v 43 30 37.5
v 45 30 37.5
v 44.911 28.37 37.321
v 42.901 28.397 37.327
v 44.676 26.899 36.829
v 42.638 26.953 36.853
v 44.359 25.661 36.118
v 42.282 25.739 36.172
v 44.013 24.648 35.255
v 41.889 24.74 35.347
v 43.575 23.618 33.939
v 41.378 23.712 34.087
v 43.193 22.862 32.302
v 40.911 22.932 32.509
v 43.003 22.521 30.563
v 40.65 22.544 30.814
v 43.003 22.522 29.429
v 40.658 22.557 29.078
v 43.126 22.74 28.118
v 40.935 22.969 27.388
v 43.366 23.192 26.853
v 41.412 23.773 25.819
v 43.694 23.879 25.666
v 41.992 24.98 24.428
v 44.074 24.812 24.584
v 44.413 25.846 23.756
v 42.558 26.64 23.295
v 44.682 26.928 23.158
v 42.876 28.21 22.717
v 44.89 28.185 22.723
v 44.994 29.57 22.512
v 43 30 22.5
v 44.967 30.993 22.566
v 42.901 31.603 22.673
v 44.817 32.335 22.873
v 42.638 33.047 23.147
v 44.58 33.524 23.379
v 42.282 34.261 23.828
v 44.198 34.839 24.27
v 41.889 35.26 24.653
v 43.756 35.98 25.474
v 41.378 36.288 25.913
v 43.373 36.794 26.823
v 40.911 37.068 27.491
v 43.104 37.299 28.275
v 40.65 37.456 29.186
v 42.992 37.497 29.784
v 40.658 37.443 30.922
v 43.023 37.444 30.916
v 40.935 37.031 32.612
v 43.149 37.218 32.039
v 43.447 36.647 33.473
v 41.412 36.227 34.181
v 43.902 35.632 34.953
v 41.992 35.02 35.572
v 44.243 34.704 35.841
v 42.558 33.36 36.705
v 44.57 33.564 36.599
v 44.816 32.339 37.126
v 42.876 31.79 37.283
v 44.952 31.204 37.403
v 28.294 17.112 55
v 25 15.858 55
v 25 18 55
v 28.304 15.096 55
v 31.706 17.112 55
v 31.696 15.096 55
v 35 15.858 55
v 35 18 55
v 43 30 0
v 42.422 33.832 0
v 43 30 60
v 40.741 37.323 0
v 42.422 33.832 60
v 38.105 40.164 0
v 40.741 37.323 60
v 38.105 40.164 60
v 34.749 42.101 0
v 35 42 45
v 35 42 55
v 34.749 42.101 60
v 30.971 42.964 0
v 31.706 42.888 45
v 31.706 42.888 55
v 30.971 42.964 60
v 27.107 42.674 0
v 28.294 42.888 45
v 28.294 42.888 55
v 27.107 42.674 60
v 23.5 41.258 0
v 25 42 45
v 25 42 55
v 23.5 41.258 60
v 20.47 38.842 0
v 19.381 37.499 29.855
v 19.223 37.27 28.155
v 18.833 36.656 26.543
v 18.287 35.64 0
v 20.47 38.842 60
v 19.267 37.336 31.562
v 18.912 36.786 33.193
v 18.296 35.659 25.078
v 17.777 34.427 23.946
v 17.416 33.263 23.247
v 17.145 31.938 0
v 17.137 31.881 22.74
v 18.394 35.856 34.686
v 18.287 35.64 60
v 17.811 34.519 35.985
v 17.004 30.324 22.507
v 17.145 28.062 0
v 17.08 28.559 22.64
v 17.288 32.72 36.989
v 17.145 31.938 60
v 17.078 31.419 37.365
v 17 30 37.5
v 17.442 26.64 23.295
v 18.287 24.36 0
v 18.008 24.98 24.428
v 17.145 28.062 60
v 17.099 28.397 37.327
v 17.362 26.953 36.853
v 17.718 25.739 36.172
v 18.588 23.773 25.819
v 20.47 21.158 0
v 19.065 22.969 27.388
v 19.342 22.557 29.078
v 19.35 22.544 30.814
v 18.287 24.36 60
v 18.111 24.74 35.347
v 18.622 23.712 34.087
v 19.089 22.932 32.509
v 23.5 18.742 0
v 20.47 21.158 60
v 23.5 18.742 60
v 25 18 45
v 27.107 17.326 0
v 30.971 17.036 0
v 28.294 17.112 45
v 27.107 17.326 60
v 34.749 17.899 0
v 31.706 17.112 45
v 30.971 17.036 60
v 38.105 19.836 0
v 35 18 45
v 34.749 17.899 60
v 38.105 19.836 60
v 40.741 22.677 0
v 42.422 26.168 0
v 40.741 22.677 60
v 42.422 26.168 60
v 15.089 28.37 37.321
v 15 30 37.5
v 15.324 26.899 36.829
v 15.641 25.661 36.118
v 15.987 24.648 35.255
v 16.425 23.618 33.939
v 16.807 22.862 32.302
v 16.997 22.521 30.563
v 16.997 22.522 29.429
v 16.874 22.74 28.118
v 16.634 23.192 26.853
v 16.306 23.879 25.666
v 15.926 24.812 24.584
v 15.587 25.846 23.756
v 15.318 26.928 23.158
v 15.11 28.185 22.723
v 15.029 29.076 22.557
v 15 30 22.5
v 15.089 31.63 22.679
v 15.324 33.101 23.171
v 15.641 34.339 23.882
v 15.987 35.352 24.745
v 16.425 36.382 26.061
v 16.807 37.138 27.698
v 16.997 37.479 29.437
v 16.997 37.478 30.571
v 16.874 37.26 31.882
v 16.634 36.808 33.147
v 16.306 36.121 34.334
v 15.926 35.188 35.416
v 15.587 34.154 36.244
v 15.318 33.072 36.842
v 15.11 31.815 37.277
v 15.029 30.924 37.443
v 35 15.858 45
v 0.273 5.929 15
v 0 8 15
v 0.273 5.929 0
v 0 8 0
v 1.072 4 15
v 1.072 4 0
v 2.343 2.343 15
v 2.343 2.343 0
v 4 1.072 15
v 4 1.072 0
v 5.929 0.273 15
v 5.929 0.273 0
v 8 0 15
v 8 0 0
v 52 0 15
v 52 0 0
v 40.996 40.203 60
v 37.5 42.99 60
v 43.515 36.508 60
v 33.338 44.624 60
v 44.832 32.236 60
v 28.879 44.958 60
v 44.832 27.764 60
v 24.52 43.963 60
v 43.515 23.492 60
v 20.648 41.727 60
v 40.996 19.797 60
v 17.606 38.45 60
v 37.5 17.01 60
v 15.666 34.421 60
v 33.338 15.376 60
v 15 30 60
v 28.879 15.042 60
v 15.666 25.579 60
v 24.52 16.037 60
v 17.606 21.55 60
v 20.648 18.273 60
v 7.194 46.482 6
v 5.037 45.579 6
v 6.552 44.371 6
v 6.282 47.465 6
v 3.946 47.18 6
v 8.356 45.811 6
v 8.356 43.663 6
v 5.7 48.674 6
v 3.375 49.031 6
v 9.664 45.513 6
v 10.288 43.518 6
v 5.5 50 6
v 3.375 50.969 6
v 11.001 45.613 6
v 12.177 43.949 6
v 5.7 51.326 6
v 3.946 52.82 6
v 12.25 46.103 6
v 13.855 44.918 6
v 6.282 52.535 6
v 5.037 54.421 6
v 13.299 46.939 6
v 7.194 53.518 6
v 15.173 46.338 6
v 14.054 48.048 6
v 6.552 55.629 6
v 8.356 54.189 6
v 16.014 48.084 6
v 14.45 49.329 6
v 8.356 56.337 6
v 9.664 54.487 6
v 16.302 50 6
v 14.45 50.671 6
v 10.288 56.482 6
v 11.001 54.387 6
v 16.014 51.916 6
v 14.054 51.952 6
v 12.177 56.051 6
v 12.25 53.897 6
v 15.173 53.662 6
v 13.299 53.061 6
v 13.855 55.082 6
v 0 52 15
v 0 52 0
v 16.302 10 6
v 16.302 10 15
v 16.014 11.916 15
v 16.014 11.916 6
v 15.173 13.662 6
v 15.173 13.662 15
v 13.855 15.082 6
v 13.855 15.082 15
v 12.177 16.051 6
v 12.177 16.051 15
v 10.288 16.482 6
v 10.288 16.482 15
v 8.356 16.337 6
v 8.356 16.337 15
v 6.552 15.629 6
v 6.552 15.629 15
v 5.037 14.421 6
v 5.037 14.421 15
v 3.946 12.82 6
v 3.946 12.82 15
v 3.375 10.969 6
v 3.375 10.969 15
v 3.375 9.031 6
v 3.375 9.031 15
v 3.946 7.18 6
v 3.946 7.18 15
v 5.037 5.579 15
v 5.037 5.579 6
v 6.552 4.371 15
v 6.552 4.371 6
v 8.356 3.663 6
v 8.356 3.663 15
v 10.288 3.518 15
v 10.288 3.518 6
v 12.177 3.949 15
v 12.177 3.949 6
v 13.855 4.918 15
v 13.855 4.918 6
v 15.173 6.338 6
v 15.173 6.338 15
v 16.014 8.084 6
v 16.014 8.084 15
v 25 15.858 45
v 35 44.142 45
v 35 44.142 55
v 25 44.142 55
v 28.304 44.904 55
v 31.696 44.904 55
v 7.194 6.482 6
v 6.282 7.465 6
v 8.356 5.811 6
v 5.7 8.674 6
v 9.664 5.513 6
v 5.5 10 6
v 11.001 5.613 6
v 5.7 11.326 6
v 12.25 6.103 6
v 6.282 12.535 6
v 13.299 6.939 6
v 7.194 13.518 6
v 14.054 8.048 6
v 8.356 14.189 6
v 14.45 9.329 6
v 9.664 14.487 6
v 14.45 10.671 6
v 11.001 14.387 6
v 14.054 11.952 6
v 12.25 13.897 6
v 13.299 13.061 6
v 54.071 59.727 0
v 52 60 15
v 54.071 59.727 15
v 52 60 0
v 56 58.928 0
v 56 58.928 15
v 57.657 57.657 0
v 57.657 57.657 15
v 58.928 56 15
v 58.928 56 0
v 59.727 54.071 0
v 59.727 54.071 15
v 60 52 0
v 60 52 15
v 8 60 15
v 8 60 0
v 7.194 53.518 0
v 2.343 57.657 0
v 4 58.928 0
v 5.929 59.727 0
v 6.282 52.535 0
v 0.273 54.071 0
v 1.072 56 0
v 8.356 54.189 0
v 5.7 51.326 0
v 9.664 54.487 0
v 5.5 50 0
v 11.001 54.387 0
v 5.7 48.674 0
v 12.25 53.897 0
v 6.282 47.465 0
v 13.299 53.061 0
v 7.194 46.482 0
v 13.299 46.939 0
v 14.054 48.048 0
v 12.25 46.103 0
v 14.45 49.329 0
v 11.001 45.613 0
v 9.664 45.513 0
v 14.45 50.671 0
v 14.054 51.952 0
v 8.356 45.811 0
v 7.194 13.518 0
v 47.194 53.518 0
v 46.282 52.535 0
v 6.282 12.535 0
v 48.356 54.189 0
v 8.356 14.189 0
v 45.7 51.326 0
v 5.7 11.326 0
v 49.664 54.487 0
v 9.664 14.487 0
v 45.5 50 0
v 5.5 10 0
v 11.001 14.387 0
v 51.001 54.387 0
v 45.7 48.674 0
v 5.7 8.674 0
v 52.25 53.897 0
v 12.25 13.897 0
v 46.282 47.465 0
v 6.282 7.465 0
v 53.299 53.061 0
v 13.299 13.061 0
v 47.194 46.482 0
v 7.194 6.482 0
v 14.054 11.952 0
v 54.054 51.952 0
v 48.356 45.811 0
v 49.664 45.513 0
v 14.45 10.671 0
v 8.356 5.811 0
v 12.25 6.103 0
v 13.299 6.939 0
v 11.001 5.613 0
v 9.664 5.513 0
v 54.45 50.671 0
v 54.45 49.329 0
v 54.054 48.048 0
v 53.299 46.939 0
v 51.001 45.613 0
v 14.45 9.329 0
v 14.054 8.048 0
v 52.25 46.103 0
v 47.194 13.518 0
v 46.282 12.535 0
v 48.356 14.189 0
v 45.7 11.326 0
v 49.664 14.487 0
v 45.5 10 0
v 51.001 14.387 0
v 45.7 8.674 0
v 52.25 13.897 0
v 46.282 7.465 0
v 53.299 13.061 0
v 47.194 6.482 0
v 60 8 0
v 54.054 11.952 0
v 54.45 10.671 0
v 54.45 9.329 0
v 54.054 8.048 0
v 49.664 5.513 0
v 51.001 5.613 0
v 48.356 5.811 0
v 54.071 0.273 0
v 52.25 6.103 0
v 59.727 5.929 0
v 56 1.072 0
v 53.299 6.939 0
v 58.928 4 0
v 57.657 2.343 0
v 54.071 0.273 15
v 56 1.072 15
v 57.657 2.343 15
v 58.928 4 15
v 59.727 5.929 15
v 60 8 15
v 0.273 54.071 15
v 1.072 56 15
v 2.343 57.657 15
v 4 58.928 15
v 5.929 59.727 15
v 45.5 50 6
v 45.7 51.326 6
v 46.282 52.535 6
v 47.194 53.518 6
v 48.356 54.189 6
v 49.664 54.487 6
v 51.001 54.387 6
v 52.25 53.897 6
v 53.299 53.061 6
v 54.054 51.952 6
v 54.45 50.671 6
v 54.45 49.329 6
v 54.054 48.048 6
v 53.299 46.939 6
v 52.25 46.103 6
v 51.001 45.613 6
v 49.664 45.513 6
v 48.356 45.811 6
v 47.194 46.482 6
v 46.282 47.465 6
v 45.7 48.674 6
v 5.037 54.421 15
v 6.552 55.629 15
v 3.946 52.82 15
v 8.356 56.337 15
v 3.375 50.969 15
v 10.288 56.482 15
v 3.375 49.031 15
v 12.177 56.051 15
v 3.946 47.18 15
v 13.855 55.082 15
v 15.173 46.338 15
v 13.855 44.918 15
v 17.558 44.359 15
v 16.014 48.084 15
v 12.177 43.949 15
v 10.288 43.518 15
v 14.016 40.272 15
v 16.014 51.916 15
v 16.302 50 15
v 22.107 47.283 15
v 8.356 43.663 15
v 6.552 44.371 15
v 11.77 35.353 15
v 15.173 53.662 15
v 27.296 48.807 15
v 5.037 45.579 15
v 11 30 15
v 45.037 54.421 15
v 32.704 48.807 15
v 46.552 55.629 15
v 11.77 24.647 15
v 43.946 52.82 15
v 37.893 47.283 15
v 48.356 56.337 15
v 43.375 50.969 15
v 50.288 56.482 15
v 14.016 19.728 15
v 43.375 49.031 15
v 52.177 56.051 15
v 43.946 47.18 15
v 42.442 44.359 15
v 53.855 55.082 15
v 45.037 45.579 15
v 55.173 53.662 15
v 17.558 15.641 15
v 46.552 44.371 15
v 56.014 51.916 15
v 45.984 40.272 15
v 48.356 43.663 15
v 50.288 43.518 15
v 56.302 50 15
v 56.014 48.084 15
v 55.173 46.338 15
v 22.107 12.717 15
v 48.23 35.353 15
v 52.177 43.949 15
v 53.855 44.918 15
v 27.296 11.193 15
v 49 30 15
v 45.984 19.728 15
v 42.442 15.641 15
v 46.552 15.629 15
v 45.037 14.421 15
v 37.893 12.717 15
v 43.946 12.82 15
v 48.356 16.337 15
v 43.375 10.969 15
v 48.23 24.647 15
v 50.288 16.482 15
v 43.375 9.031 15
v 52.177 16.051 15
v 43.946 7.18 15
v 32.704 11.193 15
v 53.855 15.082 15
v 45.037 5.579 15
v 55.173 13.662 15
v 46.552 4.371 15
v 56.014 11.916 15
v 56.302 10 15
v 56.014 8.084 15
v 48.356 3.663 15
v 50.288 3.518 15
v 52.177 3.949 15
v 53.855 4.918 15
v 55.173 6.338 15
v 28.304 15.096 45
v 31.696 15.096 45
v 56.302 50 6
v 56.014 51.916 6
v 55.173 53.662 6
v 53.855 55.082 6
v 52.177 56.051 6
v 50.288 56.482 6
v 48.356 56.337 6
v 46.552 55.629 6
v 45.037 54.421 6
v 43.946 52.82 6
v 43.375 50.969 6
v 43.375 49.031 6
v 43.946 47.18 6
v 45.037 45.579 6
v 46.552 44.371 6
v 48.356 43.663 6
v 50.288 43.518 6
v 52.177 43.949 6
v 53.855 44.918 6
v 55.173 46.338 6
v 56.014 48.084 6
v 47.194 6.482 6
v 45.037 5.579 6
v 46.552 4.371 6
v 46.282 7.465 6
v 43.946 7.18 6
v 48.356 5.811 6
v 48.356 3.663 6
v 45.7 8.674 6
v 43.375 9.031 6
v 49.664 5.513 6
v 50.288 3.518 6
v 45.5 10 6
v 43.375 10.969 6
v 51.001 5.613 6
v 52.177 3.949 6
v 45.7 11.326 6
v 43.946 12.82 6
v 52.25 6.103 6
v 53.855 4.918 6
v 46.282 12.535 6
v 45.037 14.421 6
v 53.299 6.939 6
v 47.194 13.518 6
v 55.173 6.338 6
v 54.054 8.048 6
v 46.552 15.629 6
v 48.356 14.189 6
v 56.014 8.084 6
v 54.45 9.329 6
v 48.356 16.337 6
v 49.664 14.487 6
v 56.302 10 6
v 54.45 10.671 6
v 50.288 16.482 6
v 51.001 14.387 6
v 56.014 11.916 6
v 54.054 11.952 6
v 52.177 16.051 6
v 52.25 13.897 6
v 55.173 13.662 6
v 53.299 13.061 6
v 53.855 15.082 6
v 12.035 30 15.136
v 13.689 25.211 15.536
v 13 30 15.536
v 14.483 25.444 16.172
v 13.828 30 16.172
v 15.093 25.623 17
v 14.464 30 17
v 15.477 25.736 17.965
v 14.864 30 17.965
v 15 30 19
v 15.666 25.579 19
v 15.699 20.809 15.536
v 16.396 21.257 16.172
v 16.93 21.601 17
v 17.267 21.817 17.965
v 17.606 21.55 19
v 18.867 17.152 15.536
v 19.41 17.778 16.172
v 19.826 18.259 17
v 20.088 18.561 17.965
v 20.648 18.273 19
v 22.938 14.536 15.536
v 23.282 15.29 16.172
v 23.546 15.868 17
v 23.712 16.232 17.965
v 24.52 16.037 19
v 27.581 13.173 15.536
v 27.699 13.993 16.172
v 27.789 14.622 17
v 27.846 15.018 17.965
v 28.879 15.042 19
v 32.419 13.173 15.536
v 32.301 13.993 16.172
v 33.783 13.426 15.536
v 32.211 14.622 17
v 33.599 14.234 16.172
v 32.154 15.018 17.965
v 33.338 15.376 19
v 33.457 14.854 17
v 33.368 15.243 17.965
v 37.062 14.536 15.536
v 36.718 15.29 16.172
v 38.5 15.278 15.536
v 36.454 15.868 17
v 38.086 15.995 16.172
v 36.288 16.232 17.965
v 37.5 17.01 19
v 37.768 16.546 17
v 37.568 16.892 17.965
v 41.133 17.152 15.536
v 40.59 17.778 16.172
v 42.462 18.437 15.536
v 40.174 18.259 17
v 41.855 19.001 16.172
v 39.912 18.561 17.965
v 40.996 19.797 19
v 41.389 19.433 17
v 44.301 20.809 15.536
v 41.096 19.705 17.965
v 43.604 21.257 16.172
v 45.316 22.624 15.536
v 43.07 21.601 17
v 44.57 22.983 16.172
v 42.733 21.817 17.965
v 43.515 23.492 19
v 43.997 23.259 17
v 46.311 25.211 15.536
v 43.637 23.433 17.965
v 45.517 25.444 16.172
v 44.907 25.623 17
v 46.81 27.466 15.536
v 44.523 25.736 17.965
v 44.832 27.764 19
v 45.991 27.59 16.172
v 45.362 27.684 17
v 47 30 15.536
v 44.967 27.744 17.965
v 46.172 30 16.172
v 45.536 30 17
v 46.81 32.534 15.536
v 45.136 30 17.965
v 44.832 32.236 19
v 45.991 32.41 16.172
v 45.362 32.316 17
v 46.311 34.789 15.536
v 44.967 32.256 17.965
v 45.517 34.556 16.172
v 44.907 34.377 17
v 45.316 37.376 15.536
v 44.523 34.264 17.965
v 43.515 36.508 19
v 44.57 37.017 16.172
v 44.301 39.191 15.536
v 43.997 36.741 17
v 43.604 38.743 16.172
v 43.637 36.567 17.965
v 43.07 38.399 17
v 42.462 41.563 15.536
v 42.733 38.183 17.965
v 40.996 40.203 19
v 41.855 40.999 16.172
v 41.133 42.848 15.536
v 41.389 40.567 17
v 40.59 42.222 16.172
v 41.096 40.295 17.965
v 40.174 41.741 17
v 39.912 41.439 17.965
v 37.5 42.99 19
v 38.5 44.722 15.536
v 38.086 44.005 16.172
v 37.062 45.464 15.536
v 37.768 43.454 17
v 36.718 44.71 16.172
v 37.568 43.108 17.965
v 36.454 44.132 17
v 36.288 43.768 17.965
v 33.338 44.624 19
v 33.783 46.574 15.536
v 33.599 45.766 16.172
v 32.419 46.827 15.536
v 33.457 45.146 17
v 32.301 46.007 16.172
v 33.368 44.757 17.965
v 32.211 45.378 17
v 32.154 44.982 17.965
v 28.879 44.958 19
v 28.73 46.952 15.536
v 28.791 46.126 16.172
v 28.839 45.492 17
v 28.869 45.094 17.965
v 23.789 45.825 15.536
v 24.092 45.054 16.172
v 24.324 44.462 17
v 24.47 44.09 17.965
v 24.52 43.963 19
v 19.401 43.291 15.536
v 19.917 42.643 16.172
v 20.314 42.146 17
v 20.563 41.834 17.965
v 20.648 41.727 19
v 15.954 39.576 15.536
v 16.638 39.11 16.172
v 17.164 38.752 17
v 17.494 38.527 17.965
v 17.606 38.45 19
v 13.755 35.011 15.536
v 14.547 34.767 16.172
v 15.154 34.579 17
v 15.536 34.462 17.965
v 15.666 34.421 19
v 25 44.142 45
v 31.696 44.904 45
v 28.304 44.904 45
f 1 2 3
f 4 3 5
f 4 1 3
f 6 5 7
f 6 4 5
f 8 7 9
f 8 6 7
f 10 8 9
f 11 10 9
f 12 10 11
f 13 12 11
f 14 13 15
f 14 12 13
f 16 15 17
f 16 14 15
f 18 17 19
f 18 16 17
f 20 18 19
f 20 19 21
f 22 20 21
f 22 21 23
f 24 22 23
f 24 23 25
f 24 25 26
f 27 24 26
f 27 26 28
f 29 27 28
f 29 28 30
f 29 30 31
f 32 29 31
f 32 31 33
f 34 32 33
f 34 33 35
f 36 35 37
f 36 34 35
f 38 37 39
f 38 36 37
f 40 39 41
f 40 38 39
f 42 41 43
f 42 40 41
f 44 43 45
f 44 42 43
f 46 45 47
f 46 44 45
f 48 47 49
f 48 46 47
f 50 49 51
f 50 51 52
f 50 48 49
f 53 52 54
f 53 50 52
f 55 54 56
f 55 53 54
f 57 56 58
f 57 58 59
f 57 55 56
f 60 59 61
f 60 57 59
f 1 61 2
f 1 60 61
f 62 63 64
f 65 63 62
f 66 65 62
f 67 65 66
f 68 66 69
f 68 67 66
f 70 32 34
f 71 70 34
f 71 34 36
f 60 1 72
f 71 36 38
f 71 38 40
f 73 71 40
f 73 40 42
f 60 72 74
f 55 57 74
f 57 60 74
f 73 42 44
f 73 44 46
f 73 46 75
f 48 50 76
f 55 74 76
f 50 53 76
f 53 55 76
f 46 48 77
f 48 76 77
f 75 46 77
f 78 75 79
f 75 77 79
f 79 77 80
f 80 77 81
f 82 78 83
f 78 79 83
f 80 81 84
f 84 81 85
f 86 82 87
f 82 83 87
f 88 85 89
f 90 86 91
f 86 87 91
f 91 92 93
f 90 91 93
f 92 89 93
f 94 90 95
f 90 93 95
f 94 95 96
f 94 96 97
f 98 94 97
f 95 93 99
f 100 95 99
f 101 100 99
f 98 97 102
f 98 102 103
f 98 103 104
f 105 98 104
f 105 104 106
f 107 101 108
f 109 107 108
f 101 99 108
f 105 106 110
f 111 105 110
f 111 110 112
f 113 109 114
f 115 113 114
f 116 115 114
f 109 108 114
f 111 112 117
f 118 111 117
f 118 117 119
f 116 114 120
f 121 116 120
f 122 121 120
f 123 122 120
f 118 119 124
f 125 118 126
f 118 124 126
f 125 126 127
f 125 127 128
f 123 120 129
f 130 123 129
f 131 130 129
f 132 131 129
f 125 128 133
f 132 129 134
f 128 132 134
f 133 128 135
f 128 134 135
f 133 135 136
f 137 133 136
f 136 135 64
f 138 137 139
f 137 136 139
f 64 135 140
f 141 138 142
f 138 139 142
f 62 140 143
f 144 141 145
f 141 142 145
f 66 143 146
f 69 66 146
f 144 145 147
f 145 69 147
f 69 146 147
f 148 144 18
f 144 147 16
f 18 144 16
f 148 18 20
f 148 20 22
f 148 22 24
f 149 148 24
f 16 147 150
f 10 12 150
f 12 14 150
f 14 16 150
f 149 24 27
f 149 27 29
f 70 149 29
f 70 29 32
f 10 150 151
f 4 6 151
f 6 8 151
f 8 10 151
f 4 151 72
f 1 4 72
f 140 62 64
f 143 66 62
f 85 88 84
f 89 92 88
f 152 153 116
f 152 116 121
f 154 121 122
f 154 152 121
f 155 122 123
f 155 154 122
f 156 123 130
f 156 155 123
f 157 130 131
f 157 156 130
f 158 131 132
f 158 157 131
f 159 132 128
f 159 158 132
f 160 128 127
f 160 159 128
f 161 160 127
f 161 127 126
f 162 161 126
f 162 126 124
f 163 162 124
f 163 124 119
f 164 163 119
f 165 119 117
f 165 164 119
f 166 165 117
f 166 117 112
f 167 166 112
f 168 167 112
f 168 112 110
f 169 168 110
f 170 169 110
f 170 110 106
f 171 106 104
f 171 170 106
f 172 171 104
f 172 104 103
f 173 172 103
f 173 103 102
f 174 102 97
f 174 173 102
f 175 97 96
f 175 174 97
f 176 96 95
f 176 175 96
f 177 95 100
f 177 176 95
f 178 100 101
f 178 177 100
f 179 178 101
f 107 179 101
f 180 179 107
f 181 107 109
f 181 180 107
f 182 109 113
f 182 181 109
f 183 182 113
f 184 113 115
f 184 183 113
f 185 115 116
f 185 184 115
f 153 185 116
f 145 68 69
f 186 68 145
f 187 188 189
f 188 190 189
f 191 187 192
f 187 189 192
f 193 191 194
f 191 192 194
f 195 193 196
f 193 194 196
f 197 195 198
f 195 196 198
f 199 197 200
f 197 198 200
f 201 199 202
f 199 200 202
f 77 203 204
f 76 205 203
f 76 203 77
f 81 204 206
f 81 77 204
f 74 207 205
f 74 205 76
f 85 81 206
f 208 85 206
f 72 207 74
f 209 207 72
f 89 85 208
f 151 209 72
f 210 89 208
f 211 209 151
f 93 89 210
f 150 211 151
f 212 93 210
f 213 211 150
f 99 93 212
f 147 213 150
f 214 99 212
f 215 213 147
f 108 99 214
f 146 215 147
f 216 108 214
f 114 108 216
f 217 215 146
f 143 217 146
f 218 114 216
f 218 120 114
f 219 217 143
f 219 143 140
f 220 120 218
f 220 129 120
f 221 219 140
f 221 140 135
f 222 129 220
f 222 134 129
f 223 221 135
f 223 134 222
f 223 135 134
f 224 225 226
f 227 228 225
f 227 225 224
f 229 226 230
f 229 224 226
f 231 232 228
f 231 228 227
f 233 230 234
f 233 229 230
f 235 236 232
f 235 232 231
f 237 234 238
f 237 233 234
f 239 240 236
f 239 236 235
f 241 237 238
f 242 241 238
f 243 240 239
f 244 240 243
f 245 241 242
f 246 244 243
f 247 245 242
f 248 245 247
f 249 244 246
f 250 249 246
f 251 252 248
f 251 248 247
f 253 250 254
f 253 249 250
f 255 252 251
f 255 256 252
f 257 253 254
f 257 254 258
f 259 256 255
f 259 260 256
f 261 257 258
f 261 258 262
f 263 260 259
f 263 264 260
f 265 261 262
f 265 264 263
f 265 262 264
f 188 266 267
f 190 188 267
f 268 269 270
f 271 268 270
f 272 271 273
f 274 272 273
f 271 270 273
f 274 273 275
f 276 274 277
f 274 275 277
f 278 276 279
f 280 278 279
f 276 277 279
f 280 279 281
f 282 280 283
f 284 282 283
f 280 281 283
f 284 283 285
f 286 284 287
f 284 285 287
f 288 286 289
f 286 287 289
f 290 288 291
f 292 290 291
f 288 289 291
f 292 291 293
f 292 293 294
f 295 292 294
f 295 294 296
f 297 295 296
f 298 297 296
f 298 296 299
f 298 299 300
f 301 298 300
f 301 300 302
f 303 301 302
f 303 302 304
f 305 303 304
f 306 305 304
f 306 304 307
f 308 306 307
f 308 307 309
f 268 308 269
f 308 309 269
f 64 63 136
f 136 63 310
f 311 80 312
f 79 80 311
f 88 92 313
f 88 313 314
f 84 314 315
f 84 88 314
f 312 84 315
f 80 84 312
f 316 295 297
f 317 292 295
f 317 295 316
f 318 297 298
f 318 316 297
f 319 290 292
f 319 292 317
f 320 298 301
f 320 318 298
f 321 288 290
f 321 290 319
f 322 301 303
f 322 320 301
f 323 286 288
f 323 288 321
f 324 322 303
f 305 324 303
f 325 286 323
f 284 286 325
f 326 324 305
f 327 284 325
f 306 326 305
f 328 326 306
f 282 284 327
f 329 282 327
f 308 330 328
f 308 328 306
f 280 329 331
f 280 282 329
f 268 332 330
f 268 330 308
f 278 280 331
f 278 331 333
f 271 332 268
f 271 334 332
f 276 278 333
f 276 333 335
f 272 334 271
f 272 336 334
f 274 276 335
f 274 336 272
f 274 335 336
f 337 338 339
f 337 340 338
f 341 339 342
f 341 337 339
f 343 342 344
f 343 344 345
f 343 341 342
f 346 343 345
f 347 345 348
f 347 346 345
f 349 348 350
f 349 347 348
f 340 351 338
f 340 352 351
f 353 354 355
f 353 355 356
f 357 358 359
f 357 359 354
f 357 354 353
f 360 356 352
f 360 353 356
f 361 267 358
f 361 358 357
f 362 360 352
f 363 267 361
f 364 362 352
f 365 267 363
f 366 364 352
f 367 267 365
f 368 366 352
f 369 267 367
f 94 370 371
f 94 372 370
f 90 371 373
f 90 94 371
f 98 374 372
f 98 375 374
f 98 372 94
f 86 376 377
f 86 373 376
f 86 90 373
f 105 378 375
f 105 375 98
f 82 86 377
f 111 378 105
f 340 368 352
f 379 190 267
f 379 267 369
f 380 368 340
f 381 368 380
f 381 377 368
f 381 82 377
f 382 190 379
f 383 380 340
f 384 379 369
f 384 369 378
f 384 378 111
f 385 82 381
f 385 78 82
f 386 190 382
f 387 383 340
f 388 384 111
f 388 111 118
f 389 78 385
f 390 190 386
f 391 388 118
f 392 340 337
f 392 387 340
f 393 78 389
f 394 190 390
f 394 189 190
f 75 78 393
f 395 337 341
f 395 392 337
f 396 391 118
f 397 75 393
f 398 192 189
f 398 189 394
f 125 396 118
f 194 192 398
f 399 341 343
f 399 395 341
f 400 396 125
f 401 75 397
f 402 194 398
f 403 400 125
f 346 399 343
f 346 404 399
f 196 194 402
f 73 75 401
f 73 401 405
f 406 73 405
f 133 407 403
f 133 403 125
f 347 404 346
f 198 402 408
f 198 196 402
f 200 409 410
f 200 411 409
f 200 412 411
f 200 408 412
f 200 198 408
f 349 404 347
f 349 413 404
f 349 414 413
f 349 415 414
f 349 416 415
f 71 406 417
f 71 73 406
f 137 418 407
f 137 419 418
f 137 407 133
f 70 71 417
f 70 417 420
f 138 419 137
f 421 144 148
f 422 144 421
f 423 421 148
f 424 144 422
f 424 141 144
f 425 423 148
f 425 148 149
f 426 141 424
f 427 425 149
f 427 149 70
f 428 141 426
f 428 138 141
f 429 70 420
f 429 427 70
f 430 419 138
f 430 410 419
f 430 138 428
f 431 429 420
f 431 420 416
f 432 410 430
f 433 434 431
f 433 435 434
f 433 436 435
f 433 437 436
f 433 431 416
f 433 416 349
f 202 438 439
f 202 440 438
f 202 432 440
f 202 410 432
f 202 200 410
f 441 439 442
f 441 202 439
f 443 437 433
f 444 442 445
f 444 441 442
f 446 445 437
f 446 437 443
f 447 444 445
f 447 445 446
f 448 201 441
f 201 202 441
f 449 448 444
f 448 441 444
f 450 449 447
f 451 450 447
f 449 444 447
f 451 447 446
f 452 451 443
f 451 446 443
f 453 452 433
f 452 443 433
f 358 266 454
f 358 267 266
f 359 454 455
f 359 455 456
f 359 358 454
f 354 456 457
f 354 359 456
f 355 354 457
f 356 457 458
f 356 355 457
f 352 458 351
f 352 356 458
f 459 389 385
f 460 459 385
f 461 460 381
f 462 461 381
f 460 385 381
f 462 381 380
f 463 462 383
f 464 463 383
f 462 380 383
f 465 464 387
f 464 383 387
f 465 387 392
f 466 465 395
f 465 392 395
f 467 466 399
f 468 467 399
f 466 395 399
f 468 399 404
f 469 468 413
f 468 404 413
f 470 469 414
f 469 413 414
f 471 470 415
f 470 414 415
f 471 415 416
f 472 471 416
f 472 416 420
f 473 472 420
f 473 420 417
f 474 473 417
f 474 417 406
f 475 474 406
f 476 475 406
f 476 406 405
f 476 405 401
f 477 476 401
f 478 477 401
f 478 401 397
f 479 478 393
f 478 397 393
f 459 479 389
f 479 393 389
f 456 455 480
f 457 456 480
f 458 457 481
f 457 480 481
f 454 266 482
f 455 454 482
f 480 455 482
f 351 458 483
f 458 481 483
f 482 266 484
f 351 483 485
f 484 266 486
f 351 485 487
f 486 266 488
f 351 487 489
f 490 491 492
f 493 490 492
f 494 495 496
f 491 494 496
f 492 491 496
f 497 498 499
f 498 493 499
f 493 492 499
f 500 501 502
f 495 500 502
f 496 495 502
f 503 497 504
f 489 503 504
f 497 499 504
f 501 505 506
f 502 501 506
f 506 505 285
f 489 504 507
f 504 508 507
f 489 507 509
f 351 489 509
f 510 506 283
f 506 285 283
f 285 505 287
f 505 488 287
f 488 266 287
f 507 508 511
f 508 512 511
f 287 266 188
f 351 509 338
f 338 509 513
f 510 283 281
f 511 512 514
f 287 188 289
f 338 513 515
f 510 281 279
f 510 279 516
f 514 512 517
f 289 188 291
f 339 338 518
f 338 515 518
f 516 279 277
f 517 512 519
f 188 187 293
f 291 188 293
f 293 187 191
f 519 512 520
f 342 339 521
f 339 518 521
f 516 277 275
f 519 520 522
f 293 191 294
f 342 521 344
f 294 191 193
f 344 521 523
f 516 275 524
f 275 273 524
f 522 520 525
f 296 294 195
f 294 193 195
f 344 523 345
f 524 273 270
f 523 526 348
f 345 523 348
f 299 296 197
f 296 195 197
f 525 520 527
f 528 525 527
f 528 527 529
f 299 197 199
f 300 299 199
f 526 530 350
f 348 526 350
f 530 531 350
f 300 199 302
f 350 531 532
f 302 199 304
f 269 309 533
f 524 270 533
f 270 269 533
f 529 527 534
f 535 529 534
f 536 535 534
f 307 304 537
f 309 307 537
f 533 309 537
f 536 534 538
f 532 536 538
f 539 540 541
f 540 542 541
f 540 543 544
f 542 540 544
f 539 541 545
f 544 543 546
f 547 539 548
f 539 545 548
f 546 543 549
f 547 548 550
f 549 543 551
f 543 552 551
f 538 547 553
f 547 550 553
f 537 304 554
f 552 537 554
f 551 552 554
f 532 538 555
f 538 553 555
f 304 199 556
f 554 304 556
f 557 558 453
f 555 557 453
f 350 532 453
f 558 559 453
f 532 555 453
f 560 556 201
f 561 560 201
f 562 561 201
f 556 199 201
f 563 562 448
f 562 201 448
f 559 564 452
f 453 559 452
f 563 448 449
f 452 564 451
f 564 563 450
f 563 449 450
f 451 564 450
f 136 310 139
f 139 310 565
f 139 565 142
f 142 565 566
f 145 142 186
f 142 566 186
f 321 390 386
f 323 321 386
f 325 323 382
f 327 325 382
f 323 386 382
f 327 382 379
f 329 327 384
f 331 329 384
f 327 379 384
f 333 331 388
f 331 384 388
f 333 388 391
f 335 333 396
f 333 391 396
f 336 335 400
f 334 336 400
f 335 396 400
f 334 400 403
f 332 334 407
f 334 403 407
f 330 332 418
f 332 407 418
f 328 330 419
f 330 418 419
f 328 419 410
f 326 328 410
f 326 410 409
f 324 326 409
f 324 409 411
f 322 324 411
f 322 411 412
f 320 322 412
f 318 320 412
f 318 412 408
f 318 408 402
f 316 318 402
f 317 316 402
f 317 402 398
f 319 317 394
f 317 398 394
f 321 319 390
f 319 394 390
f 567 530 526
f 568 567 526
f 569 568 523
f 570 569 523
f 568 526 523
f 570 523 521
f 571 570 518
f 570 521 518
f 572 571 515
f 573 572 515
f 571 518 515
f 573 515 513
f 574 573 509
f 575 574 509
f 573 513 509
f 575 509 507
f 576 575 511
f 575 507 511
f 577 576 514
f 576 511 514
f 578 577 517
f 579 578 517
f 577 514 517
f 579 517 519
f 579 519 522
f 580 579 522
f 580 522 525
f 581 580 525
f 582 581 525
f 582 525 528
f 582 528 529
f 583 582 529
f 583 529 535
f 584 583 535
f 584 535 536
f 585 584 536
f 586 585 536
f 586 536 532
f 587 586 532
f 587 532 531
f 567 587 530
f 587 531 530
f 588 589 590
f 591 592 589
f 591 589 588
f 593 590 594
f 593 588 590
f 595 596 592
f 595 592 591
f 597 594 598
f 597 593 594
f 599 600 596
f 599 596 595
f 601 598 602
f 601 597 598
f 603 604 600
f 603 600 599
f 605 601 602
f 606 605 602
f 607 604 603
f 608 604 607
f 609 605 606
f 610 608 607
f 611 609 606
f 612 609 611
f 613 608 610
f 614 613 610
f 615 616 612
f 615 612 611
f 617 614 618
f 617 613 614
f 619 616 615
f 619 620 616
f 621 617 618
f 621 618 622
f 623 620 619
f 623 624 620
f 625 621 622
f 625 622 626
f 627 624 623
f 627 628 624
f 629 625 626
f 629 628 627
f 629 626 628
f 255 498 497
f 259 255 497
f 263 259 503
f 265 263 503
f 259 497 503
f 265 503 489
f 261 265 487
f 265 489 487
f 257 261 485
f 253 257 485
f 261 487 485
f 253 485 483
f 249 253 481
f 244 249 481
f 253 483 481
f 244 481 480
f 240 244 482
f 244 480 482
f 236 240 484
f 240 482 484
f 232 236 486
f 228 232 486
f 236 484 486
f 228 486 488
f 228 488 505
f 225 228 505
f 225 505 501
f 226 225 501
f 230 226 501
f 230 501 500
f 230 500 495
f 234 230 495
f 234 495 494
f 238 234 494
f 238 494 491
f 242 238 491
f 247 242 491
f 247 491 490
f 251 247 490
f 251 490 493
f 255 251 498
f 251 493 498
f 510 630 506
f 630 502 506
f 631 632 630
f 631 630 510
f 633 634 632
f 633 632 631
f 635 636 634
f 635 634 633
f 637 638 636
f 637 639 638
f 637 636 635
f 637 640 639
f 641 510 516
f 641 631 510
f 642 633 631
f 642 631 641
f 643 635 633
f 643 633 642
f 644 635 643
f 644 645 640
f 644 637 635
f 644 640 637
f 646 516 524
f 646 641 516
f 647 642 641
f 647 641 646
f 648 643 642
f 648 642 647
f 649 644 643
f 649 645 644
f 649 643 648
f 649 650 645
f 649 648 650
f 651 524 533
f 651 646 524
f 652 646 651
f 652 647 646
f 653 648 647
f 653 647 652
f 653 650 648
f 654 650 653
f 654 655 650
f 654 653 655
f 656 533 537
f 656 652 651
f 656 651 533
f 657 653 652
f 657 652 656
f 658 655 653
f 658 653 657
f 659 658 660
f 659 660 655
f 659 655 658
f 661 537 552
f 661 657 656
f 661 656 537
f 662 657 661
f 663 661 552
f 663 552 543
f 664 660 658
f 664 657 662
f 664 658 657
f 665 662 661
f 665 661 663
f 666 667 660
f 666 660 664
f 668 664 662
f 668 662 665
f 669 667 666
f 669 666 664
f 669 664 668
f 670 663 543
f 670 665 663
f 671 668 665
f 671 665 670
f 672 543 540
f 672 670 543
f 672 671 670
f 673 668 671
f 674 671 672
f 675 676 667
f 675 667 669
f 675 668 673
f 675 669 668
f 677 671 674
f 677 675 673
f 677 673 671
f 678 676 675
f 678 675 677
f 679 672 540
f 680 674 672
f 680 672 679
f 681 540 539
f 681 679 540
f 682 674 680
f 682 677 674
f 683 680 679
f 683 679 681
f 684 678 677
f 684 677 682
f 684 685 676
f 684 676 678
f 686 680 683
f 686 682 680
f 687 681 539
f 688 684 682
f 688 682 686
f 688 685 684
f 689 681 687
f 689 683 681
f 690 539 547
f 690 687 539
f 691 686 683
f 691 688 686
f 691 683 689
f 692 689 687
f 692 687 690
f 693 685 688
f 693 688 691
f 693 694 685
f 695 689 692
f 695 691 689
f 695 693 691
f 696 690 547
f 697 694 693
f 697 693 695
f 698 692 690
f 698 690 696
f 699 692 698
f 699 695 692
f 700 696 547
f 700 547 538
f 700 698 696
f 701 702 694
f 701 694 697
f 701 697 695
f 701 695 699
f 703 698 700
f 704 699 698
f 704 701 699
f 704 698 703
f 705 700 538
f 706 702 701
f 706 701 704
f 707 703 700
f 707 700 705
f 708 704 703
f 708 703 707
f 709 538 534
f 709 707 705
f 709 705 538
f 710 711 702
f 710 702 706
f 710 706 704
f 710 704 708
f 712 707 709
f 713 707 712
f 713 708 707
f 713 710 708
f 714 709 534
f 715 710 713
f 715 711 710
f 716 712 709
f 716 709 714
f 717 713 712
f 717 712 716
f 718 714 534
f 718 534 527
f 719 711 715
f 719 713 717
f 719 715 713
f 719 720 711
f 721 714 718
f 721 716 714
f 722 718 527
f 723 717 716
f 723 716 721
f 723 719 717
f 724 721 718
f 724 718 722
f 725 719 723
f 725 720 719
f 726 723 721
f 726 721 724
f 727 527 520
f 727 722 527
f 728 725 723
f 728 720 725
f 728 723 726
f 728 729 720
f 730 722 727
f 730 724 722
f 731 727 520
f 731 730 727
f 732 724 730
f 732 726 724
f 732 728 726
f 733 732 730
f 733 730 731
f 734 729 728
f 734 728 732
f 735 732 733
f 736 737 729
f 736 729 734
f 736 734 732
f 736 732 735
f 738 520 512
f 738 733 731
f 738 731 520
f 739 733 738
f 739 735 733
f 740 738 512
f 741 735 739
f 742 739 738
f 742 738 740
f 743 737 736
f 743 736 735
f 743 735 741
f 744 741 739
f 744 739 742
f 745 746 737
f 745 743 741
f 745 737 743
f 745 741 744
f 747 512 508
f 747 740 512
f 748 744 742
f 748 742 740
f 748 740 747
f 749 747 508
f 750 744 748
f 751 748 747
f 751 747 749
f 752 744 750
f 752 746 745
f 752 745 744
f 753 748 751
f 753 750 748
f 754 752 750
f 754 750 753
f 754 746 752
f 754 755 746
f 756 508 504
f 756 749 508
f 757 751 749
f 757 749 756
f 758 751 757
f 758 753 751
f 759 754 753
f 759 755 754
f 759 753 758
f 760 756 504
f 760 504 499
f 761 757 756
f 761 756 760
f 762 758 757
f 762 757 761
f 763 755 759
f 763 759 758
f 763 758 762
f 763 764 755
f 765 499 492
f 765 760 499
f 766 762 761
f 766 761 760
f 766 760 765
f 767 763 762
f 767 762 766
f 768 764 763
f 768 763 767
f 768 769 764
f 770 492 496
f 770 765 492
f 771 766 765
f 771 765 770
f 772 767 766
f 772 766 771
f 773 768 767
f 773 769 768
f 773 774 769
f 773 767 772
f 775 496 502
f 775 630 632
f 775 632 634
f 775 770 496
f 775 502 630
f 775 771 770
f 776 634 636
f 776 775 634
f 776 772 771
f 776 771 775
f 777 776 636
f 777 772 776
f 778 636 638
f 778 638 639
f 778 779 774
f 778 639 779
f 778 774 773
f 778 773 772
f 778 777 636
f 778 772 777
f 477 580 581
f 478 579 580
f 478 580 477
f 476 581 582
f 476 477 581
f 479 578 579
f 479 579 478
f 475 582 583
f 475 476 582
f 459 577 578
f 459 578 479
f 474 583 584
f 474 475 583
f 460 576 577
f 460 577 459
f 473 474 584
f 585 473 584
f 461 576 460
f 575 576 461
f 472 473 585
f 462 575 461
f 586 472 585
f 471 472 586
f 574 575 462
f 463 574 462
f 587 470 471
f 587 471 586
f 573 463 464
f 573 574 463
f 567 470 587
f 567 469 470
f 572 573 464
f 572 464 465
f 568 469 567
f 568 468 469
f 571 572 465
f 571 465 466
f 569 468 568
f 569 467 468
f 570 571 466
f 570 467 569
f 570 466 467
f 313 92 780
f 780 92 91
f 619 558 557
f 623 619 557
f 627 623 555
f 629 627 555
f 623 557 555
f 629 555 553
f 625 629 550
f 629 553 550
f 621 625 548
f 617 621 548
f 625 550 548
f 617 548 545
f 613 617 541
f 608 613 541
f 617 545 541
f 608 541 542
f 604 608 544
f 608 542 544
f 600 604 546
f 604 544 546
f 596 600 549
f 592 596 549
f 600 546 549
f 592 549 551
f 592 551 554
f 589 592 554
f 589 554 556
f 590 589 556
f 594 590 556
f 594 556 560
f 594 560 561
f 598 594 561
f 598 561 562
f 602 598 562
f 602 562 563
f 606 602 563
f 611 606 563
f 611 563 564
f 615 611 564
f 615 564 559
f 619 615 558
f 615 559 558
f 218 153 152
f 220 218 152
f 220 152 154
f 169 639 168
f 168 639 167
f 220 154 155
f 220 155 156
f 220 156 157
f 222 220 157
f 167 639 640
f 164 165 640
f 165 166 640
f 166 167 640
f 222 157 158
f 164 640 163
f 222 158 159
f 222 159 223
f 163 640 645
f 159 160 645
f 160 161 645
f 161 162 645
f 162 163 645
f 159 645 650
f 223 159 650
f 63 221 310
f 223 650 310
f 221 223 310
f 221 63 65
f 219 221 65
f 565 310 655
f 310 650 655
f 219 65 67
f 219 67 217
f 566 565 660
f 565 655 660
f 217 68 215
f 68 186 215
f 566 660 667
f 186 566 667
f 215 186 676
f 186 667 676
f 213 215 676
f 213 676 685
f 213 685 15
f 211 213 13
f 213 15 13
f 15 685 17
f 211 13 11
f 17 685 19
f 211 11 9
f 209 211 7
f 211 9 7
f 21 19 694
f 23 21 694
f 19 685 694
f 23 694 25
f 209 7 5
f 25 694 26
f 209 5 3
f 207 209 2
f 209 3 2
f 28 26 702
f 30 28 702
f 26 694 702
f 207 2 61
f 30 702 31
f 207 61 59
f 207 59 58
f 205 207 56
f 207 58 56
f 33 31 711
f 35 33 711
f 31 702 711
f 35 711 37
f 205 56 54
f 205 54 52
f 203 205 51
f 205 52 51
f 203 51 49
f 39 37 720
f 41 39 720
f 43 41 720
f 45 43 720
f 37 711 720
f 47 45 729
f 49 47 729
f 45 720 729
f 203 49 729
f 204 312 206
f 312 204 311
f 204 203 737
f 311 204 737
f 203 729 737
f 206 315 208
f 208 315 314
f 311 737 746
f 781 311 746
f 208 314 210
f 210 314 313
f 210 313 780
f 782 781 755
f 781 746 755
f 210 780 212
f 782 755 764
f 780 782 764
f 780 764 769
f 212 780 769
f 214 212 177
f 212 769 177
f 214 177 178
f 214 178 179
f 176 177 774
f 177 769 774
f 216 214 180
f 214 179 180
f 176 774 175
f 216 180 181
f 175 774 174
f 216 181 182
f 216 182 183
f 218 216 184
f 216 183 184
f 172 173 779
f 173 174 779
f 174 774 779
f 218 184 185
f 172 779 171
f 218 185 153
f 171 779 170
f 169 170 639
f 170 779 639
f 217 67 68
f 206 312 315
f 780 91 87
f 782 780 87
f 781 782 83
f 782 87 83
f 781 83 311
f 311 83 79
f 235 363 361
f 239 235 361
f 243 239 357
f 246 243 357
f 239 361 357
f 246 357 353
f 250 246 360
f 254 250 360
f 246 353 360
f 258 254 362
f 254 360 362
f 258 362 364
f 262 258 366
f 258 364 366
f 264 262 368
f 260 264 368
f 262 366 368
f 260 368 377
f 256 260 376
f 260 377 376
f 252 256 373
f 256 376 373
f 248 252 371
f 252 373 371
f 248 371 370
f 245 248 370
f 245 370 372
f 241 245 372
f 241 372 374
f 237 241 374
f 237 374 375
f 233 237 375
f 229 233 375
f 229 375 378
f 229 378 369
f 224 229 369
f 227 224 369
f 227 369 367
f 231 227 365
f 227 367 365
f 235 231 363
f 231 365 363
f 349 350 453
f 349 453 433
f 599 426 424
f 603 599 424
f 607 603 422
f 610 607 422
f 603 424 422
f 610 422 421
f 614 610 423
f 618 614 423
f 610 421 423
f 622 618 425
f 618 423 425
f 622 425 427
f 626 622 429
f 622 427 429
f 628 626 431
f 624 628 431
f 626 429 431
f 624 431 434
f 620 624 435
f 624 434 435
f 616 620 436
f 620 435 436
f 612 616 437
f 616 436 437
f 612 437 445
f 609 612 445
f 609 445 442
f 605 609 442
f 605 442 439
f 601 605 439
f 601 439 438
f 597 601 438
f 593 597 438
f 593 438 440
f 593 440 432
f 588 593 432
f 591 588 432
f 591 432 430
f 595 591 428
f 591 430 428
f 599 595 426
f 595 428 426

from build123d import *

# Parameters (mm, degrees)
ESBO_O1_W                = 60
ESBO_O1_H                = 15
RESSALTO_EXTRUS_O1_DEPTH = 60
ESBO_O4_R                = 6.5
CORTE_EXTRUS_O1_DEPTH    = 9
ESBO_O5_R                = 4.5
CORTE_EXTRUS_O2_DEPTH    = 6
ESBO_O6_R                = 15
RESSALTO_EXTRUS_O3_DEPTH = 45
ESBO_O7_R                = 13
CORTE_EXTRUS_O3_DEPTH    = 104.923048454
FILETE2_R                = 4
ESBO_O8_R                = 7.5
CORTE_EXTRUS_O10_DEPTH   = 104.923048454
ESBO_O9_W                = 10
ESBO_O9_H                = 10
CORTE_EXTRUS_O11_DEPTH   = 104.923048512
FILETE3_R                = 8


with BuildPart() as part:
    # Esboço1 → Ressalto-extrusão1 (new body)
    with BuildSketch(Plane(origin=(0, 0, 0), x_dir=(1, 0, 0), z_dir=(0, 1, 0))):
        with Locations((30, -7.5)):
            Rectangle(ESBO_O1_W, ESBO_O1_H)
    extrude(amount=RESSALTO_EXTRUS_O1_DEPTH)

    # Esboço4 → Corte-extrusão1 (cut)
    with BuildSketch(Plane.XY.offset(15)):
        with Locations((9.802292797, 50)):
            Circle(ESBO_O4_R)
        with Locations((49.802292797, 50)):
            Circle(ESBO_O4_R)
        with Locations((9.802292797, 10)):
            Circle(ESBO_O4_R)
        with Locations((49.802292797, 10)):
            Circle(ESBO_O4_R)
    extrude(amount=-CORTE_EXTRUS_O1_DEPTH, mode=Mode.SUBTRACT)

    # Esboço5 → Corte-extrusão2 (cut)
    with BuildSketch(Plane(origin=(0, 0, 0), x_dir=(-1, 0, 0), z_dir=(0, 0, -1))):
        with Locations((-50, 50)):
            Circle(ESBO_O5_R)
        with Locations((-10, 50)):
            Circle(ESBO_O5_R)
        with Locations((-50, 10)):
            Circle(ESBO_O5_R)
        with Locations((-10, 10)):
            Circle(ESBO_O5_R)
    extrude(amount=-CORTE_EXTRUS_O2_DEPTH, mode=Mode.SUBTRACT)

    # Esboço6 → Ressalto-extrusão3 (add)
    with BuildSketch(Plane.XY.offset(15)):
        with Locations(Location((30, 30, 0), (0, 0, 180))):
            Circle(ESBO_O6_R)
    extrude(amount=RESSALTO_EXTRUS_O3_DEPTH)

    # Esboço7 → Corte-extrusão3 (cut, through all)
    with BuildSketch(Plane.XY.offset(60)):
        with Locations((30, 30)):
            Circle(ESBO_O7_R)
    extrude(amount=-CORTE_EXTRUS_O3_DEPTH, mode=Mode.SUBTRACT)

    # Filete2
    filete2_edges = [part.edges().sort_by_distance(p)[0] for p in [
        (45, 30, 15),
    ]]
    fillet(filete2_edges, radius=FILETE2_R)

    # Esboço8 → Corte-extrusão10 (cut, through all)
    with BuildSketch(Plane(origin=(0, 0, 0), x_dir=(0, 0, -1), z_dir=(1, 0, 0))):
        with Locations(Location((-30, 30, 0), (0, 0, 180))):
            Circle(ESBO_O8_R)
    extrude(amount=CORTE_EXTRUS_O10_DEPTH, mode=Mode.SUBTRACT)

    # Esboço9 → Corte-extrusão11 (cut, through all)
    with BuildSketch(Plane(origin=(0, 0, 0), x_dir=(1, 0, 0), z_dir=(0, 1, 0))):
        with Locations((30, -50)):
            Rectangle(ESBO_O9_W, ESBO_O9_H)
    extrude(amount=CORTE_EXTRUS_O11_DEPTH, mode=Mode.SUBTRACT)

    # Filete3
    filete3_edges = [part.edges().sort_by_distance(p)[0] for p in [
        (60, 60, 7.5),
        (60, 0, 7.5),
        (0, 0, 7.5),
        (0, 60, 7.5),
    ]]
    fillet(filete3_edges, radius=FILETE3_R)


solid = part.part
